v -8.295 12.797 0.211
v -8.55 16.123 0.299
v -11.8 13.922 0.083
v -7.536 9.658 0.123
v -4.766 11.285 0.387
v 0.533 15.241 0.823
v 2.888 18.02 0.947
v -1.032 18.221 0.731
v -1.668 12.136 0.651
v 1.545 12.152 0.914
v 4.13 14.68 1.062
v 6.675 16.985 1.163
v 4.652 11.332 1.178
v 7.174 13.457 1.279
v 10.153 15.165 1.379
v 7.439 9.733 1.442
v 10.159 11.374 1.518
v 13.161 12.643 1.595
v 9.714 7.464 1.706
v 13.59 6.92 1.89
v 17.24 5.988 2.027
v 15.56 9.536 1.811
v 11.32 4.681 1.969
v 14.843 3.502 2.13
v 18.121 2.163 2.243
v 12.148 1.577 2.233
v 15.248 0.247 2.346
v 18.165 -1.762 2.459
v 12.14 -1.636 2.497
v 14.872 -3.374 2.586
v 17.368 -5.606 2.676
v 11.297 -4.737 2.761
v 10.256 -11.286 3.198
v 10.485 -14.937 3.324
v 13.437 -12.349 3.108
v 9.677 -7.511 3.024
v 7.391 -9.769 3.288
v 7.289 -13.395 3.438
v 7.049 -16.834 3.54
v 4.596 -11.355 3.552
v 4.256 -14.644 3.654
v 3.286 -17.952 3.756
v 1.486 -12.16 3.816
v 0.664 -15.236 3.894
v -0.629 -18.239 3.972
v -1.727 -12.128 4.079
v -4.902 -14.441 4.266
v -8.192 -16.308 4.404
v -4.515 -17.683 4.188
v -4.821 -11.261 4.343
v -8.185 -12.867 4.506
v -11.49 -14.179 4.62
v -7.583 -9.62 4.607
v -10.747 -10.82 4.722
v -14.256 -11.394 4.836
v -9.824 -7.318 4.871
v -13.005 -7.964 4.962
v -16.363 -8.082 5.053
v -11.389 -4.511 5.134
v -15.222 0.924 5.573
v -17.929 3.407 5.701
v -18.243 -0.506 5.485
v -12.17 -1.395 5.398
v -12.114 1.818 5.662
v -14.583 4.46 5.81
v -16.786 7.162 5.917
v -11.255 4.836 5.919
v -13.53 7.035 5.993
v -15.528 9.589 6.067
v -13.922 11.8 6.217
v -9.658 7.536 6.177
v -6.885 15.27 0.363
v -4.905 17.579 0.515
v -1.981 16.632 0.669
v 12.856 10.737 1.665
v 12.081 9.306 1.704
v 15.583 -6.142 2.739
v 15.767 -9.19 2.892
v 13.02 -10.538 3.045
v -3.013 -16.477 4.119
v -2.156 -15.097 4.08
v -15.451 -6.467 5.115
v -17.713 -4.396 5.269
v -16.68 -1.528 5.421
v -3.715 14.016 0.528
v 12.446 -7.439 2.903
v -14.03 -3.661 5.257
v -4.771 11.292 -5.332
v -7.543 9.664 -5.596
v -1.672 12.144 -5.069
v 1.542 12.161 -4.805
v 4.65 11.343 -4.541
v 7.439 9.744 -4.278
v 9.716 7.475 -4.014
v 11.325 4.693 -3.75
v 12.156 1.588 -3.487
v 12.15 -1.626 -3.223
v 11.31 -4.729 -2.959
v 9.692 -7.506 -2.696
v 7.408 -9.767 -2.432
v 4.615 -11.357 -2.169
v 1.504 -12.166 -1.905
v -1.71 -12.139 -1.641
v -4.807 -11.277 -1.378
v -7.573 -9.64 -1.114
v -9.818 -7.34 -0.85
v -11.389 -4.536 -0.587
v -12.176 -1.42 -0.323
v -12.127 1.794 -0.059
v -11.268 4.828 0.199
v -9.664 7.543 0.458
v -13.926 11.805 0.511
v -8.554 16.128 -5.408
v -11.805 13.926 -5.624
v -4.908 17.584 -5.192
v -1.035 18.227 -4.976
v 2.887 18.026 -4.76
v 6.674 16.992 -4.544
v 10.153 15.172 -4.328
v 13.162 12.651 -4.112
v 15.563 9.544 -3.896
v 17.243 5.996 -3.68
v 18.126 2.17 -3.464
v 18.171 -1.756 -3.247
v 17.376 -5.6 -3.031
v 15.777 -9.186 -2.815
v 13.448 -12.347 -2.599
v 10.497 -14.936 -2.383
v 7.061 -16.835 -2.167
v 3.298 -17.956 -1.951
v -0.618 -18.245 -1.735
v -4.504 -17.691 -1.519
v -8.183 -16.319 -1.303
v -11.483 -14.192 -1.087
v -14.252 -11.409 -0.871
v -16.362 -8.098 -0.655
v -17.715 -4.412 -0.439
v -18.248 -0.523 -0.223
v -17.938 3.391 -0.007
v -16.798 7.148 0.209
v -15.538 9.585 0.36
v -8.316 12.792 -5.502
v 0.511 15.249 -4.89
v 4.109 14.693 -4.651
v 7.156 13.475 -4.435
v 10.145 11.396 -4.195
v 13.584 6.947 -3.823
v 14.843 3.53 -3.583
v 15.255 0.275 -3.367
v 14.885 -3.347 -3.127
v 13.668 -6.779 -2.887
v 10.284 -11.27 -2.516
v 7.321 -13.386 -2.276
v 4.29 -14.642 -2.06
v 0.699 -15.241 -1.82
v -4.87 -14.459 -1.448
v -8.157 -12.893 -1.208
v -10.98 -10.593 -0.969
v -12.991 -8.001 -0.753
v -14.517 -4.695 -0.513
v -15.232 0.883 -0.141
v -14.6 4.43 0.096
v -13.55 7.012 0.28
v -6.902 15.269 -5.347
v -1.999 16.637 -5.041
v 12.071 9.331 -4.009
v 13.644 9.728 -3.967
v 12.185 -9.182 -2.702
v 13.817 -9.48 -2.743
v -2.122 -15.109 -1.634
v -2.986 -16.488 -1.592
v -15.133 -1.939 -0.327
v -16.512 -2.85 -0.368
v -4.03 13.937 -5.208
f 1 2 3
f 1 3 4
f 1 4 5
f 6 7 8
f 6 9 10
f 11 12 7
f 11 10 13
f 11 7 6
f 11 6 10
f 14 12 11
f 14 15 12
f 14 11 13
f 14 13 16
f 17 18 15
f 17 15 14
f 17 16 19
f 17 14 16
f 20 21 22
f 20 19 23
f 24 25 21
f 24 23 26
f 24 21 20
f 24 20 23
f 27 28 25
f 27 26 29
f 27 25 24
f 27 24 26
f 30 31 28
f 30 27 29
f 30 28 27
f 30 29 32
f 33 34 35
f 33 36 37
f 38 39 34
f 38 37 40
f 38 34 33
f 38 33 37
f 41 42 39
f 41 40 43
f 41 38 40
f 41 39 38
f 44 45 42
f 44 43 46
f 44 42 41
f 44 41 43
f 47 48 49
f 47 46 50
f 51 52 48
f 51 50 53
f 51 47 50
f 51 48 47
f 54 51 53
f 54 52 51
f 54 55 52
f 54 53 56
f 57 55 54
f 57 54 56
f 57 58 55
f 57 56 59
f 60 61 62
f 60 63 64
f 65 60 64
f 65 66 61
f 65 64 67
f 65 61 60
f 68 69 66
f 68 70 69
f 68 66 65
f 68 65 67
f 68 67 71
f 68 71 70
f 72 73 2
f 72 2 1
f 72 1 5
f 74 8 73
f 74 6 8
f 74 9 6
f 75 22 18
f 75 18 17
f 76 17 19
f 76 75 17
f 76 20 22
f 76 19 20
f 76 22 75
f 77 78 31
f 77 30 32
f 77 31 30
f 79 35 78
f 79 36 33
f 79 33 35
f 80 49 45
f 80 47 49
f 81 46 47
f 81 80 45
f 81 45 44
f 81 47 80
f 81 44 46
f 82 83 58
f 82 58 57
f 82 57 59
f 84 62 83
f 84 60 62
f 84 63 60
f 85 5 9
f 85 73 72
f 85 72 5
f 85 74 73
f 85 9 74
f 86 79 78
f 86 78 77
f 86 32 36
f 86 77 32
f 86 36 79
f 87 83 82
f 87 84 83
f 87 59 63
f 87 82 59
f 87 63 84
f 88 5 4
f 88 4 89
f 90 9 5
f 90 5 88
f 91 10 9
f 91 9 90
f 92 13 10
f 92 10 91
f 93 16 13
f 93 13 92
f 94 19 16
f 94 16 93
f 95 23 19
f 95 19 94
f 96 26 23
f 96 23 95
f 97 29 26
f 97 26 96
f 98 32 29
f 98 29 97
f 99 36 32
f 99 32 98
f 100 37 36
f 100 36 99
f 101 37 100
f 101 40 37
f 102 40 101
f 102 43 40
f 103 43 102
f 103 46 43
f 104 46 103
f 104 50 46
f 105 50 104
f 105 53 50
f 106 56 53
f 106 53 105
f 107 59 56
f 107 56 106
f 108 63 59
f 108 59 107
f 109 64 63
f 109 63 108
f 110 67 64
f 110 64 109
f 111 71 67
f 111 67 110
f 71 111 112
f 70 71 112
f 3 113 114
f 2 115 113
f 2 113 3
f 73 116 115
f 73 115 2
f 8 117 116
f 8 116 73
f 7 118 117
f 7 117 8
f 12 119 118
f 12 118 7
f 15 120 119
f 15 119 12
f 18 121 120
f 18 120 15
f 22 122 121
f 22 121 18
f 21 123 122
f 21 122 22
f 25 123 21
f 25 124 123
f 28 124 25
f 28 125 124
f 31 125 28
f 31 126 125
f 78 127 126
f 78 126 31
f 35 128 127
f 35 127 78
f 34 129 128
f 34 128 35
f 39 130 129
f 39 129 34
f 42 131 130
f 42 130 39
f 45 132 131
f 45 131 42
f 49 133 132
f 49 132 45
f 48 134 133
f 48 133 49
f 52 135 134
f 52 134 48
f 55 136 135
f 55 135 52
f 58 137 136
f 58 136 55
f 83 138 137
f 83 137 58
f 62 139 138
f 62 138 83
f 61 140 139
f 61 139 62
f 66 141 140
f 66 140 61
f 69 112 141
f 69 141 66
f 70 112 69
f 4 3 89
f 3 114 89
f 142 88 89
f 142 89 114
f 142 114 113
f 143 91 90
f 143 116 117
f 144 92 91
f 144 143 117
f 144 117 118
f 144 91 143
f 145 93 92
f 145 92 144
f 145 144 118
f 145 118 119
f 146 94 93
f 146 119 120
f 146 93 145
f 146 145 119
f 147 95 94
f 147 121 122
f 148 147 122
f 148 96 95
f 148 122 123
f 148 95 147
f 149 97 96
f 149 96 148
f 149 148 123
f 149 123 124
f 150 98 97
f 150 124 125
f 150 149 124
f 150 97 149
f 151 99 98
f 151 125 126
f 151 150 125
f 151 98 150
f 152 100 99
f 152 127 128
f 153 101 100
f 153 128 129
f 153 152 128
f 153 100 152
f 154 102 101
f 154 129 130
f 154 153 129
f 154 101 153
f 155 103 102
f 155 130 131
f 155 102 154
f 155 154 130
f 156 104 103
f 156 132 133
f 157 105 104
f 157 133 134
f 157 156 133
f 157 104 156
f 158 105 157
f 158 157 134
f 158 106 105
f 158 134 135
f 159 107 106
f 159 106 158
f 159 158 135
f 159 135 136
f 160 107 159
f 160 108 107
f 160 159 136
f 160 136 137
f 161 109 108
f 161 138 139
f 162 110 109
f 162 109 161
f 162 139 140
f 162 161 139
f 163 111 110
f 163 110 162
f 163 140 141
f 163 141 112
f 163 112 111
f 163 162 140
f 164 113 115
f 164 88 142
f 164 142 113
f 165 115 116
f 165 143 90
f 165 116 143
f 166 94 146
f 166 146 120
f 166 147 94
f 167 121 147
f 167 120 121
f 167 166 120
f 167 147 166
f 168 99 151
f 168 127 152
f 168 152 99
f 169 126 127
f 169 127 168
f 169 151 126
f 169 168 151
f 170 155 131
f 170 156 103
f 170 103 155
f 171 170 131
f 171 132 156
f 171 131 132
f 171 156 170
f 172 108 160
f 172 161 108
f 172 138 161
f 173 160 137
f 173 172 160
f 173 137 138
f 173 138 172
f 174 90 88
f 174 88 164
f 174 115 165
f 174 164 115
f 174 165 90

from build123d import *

# Parameters (mm, degrees)
EXTRUDE_804_DEPTH        = 0.001
EXTRUDE_804_DEPTH_BACK   = 0.001
SKETCH_6_W               = 5.66
SKETCH_6_H               = 5.96
SWEEP_3_PITCH            = 6.3
SWEEP_3_HEIGHT           = 6.3
SWEEP_3_RADIUS           = 12.25
SWEEP_3_START_ANGLE      = 135
SKETCH_7_W               = 5.7
SKETCH_7_H               = 6
CUT_EXTRUDE_1_DEPTH      = 27.575335967
CUT_EXTRUDE_1_DEPTH_BACK = 27.575335967


with BuildPart() as part:
    # 草图6 → Extrude 804 (new, two sides: drawn at the far end of the back side and taken through both)
    with BuildSketch(Plane(origin=(-8.66205807, 8.66205807, 6.3), x_dir=(0.05768456812732666, 0.057684568127325205, -0.9966669359419564), z_dir=(0.7047499489889816, 0.70474994898897, 0.08157829858529911)).offset(-EXTRUDE_804_DEPTH_BACK)):
        with Locations((2.85, 3)):
            Rectangle(SKETCH_6_W, SKETCH_6_H)
    extrude(amount=EXTRUDE_804_DEPTH + EXTRUDE_804_DEPTH_BACK)

    # 凸台-扫描3: sweep along a helix
    with BuildLine() as sweep_3_path:
        add(Helix(SWEEP_3_PITCH, SWEEP_3_HEIGHT, SWEEP_3_RADIUS, center=(0, 0, 0), direction=(0, 0, 1), lefthand=True, mode=Mode.PRIVATE).rotate(Axis((0, 0, 0), (0, 0, 1)), SWEEP_3_START_ANGLE))
    # 草图7 → 凸台-扫描3 (sweep)
    with BuildSketch(Plane(origin=(-8.66205807, 8.66205807, 6.3), x_dir=(0.05768456812732666, 0.057684568127325205, -0.9966669359419564), z_dir=(0.7047499489889816, 0.70474994898897, 0.08157829858529911))):
        with Locations((2.85, 3)):
            Rectangle(SKETCH_7_W, SKETCH_7_H)
    sweep(path=sweep_3_path.line, is_frenet=True)

    # 草图9 → 切除-拉伸1 (cut, two sides: drawn at the far end of the back side and taken through both)
    with BuildSketch(Plane.XY.offset(-CUT_EXTRUDE_1_DEPTH_BACK)):
        Polygon((-34.190291265, 36.311611608), (0.811494404, 1.30982594), (-1.30982594, -0.811494404), (-38.432931952, 36.311611608), align=None)
    extrude(amount=CUT_EXTRUDE_1_DEPTH + CUT_EXTRUDE_1_DEPTH_BACK, mode=Mode.SUBTRACT)


solid = part.part
